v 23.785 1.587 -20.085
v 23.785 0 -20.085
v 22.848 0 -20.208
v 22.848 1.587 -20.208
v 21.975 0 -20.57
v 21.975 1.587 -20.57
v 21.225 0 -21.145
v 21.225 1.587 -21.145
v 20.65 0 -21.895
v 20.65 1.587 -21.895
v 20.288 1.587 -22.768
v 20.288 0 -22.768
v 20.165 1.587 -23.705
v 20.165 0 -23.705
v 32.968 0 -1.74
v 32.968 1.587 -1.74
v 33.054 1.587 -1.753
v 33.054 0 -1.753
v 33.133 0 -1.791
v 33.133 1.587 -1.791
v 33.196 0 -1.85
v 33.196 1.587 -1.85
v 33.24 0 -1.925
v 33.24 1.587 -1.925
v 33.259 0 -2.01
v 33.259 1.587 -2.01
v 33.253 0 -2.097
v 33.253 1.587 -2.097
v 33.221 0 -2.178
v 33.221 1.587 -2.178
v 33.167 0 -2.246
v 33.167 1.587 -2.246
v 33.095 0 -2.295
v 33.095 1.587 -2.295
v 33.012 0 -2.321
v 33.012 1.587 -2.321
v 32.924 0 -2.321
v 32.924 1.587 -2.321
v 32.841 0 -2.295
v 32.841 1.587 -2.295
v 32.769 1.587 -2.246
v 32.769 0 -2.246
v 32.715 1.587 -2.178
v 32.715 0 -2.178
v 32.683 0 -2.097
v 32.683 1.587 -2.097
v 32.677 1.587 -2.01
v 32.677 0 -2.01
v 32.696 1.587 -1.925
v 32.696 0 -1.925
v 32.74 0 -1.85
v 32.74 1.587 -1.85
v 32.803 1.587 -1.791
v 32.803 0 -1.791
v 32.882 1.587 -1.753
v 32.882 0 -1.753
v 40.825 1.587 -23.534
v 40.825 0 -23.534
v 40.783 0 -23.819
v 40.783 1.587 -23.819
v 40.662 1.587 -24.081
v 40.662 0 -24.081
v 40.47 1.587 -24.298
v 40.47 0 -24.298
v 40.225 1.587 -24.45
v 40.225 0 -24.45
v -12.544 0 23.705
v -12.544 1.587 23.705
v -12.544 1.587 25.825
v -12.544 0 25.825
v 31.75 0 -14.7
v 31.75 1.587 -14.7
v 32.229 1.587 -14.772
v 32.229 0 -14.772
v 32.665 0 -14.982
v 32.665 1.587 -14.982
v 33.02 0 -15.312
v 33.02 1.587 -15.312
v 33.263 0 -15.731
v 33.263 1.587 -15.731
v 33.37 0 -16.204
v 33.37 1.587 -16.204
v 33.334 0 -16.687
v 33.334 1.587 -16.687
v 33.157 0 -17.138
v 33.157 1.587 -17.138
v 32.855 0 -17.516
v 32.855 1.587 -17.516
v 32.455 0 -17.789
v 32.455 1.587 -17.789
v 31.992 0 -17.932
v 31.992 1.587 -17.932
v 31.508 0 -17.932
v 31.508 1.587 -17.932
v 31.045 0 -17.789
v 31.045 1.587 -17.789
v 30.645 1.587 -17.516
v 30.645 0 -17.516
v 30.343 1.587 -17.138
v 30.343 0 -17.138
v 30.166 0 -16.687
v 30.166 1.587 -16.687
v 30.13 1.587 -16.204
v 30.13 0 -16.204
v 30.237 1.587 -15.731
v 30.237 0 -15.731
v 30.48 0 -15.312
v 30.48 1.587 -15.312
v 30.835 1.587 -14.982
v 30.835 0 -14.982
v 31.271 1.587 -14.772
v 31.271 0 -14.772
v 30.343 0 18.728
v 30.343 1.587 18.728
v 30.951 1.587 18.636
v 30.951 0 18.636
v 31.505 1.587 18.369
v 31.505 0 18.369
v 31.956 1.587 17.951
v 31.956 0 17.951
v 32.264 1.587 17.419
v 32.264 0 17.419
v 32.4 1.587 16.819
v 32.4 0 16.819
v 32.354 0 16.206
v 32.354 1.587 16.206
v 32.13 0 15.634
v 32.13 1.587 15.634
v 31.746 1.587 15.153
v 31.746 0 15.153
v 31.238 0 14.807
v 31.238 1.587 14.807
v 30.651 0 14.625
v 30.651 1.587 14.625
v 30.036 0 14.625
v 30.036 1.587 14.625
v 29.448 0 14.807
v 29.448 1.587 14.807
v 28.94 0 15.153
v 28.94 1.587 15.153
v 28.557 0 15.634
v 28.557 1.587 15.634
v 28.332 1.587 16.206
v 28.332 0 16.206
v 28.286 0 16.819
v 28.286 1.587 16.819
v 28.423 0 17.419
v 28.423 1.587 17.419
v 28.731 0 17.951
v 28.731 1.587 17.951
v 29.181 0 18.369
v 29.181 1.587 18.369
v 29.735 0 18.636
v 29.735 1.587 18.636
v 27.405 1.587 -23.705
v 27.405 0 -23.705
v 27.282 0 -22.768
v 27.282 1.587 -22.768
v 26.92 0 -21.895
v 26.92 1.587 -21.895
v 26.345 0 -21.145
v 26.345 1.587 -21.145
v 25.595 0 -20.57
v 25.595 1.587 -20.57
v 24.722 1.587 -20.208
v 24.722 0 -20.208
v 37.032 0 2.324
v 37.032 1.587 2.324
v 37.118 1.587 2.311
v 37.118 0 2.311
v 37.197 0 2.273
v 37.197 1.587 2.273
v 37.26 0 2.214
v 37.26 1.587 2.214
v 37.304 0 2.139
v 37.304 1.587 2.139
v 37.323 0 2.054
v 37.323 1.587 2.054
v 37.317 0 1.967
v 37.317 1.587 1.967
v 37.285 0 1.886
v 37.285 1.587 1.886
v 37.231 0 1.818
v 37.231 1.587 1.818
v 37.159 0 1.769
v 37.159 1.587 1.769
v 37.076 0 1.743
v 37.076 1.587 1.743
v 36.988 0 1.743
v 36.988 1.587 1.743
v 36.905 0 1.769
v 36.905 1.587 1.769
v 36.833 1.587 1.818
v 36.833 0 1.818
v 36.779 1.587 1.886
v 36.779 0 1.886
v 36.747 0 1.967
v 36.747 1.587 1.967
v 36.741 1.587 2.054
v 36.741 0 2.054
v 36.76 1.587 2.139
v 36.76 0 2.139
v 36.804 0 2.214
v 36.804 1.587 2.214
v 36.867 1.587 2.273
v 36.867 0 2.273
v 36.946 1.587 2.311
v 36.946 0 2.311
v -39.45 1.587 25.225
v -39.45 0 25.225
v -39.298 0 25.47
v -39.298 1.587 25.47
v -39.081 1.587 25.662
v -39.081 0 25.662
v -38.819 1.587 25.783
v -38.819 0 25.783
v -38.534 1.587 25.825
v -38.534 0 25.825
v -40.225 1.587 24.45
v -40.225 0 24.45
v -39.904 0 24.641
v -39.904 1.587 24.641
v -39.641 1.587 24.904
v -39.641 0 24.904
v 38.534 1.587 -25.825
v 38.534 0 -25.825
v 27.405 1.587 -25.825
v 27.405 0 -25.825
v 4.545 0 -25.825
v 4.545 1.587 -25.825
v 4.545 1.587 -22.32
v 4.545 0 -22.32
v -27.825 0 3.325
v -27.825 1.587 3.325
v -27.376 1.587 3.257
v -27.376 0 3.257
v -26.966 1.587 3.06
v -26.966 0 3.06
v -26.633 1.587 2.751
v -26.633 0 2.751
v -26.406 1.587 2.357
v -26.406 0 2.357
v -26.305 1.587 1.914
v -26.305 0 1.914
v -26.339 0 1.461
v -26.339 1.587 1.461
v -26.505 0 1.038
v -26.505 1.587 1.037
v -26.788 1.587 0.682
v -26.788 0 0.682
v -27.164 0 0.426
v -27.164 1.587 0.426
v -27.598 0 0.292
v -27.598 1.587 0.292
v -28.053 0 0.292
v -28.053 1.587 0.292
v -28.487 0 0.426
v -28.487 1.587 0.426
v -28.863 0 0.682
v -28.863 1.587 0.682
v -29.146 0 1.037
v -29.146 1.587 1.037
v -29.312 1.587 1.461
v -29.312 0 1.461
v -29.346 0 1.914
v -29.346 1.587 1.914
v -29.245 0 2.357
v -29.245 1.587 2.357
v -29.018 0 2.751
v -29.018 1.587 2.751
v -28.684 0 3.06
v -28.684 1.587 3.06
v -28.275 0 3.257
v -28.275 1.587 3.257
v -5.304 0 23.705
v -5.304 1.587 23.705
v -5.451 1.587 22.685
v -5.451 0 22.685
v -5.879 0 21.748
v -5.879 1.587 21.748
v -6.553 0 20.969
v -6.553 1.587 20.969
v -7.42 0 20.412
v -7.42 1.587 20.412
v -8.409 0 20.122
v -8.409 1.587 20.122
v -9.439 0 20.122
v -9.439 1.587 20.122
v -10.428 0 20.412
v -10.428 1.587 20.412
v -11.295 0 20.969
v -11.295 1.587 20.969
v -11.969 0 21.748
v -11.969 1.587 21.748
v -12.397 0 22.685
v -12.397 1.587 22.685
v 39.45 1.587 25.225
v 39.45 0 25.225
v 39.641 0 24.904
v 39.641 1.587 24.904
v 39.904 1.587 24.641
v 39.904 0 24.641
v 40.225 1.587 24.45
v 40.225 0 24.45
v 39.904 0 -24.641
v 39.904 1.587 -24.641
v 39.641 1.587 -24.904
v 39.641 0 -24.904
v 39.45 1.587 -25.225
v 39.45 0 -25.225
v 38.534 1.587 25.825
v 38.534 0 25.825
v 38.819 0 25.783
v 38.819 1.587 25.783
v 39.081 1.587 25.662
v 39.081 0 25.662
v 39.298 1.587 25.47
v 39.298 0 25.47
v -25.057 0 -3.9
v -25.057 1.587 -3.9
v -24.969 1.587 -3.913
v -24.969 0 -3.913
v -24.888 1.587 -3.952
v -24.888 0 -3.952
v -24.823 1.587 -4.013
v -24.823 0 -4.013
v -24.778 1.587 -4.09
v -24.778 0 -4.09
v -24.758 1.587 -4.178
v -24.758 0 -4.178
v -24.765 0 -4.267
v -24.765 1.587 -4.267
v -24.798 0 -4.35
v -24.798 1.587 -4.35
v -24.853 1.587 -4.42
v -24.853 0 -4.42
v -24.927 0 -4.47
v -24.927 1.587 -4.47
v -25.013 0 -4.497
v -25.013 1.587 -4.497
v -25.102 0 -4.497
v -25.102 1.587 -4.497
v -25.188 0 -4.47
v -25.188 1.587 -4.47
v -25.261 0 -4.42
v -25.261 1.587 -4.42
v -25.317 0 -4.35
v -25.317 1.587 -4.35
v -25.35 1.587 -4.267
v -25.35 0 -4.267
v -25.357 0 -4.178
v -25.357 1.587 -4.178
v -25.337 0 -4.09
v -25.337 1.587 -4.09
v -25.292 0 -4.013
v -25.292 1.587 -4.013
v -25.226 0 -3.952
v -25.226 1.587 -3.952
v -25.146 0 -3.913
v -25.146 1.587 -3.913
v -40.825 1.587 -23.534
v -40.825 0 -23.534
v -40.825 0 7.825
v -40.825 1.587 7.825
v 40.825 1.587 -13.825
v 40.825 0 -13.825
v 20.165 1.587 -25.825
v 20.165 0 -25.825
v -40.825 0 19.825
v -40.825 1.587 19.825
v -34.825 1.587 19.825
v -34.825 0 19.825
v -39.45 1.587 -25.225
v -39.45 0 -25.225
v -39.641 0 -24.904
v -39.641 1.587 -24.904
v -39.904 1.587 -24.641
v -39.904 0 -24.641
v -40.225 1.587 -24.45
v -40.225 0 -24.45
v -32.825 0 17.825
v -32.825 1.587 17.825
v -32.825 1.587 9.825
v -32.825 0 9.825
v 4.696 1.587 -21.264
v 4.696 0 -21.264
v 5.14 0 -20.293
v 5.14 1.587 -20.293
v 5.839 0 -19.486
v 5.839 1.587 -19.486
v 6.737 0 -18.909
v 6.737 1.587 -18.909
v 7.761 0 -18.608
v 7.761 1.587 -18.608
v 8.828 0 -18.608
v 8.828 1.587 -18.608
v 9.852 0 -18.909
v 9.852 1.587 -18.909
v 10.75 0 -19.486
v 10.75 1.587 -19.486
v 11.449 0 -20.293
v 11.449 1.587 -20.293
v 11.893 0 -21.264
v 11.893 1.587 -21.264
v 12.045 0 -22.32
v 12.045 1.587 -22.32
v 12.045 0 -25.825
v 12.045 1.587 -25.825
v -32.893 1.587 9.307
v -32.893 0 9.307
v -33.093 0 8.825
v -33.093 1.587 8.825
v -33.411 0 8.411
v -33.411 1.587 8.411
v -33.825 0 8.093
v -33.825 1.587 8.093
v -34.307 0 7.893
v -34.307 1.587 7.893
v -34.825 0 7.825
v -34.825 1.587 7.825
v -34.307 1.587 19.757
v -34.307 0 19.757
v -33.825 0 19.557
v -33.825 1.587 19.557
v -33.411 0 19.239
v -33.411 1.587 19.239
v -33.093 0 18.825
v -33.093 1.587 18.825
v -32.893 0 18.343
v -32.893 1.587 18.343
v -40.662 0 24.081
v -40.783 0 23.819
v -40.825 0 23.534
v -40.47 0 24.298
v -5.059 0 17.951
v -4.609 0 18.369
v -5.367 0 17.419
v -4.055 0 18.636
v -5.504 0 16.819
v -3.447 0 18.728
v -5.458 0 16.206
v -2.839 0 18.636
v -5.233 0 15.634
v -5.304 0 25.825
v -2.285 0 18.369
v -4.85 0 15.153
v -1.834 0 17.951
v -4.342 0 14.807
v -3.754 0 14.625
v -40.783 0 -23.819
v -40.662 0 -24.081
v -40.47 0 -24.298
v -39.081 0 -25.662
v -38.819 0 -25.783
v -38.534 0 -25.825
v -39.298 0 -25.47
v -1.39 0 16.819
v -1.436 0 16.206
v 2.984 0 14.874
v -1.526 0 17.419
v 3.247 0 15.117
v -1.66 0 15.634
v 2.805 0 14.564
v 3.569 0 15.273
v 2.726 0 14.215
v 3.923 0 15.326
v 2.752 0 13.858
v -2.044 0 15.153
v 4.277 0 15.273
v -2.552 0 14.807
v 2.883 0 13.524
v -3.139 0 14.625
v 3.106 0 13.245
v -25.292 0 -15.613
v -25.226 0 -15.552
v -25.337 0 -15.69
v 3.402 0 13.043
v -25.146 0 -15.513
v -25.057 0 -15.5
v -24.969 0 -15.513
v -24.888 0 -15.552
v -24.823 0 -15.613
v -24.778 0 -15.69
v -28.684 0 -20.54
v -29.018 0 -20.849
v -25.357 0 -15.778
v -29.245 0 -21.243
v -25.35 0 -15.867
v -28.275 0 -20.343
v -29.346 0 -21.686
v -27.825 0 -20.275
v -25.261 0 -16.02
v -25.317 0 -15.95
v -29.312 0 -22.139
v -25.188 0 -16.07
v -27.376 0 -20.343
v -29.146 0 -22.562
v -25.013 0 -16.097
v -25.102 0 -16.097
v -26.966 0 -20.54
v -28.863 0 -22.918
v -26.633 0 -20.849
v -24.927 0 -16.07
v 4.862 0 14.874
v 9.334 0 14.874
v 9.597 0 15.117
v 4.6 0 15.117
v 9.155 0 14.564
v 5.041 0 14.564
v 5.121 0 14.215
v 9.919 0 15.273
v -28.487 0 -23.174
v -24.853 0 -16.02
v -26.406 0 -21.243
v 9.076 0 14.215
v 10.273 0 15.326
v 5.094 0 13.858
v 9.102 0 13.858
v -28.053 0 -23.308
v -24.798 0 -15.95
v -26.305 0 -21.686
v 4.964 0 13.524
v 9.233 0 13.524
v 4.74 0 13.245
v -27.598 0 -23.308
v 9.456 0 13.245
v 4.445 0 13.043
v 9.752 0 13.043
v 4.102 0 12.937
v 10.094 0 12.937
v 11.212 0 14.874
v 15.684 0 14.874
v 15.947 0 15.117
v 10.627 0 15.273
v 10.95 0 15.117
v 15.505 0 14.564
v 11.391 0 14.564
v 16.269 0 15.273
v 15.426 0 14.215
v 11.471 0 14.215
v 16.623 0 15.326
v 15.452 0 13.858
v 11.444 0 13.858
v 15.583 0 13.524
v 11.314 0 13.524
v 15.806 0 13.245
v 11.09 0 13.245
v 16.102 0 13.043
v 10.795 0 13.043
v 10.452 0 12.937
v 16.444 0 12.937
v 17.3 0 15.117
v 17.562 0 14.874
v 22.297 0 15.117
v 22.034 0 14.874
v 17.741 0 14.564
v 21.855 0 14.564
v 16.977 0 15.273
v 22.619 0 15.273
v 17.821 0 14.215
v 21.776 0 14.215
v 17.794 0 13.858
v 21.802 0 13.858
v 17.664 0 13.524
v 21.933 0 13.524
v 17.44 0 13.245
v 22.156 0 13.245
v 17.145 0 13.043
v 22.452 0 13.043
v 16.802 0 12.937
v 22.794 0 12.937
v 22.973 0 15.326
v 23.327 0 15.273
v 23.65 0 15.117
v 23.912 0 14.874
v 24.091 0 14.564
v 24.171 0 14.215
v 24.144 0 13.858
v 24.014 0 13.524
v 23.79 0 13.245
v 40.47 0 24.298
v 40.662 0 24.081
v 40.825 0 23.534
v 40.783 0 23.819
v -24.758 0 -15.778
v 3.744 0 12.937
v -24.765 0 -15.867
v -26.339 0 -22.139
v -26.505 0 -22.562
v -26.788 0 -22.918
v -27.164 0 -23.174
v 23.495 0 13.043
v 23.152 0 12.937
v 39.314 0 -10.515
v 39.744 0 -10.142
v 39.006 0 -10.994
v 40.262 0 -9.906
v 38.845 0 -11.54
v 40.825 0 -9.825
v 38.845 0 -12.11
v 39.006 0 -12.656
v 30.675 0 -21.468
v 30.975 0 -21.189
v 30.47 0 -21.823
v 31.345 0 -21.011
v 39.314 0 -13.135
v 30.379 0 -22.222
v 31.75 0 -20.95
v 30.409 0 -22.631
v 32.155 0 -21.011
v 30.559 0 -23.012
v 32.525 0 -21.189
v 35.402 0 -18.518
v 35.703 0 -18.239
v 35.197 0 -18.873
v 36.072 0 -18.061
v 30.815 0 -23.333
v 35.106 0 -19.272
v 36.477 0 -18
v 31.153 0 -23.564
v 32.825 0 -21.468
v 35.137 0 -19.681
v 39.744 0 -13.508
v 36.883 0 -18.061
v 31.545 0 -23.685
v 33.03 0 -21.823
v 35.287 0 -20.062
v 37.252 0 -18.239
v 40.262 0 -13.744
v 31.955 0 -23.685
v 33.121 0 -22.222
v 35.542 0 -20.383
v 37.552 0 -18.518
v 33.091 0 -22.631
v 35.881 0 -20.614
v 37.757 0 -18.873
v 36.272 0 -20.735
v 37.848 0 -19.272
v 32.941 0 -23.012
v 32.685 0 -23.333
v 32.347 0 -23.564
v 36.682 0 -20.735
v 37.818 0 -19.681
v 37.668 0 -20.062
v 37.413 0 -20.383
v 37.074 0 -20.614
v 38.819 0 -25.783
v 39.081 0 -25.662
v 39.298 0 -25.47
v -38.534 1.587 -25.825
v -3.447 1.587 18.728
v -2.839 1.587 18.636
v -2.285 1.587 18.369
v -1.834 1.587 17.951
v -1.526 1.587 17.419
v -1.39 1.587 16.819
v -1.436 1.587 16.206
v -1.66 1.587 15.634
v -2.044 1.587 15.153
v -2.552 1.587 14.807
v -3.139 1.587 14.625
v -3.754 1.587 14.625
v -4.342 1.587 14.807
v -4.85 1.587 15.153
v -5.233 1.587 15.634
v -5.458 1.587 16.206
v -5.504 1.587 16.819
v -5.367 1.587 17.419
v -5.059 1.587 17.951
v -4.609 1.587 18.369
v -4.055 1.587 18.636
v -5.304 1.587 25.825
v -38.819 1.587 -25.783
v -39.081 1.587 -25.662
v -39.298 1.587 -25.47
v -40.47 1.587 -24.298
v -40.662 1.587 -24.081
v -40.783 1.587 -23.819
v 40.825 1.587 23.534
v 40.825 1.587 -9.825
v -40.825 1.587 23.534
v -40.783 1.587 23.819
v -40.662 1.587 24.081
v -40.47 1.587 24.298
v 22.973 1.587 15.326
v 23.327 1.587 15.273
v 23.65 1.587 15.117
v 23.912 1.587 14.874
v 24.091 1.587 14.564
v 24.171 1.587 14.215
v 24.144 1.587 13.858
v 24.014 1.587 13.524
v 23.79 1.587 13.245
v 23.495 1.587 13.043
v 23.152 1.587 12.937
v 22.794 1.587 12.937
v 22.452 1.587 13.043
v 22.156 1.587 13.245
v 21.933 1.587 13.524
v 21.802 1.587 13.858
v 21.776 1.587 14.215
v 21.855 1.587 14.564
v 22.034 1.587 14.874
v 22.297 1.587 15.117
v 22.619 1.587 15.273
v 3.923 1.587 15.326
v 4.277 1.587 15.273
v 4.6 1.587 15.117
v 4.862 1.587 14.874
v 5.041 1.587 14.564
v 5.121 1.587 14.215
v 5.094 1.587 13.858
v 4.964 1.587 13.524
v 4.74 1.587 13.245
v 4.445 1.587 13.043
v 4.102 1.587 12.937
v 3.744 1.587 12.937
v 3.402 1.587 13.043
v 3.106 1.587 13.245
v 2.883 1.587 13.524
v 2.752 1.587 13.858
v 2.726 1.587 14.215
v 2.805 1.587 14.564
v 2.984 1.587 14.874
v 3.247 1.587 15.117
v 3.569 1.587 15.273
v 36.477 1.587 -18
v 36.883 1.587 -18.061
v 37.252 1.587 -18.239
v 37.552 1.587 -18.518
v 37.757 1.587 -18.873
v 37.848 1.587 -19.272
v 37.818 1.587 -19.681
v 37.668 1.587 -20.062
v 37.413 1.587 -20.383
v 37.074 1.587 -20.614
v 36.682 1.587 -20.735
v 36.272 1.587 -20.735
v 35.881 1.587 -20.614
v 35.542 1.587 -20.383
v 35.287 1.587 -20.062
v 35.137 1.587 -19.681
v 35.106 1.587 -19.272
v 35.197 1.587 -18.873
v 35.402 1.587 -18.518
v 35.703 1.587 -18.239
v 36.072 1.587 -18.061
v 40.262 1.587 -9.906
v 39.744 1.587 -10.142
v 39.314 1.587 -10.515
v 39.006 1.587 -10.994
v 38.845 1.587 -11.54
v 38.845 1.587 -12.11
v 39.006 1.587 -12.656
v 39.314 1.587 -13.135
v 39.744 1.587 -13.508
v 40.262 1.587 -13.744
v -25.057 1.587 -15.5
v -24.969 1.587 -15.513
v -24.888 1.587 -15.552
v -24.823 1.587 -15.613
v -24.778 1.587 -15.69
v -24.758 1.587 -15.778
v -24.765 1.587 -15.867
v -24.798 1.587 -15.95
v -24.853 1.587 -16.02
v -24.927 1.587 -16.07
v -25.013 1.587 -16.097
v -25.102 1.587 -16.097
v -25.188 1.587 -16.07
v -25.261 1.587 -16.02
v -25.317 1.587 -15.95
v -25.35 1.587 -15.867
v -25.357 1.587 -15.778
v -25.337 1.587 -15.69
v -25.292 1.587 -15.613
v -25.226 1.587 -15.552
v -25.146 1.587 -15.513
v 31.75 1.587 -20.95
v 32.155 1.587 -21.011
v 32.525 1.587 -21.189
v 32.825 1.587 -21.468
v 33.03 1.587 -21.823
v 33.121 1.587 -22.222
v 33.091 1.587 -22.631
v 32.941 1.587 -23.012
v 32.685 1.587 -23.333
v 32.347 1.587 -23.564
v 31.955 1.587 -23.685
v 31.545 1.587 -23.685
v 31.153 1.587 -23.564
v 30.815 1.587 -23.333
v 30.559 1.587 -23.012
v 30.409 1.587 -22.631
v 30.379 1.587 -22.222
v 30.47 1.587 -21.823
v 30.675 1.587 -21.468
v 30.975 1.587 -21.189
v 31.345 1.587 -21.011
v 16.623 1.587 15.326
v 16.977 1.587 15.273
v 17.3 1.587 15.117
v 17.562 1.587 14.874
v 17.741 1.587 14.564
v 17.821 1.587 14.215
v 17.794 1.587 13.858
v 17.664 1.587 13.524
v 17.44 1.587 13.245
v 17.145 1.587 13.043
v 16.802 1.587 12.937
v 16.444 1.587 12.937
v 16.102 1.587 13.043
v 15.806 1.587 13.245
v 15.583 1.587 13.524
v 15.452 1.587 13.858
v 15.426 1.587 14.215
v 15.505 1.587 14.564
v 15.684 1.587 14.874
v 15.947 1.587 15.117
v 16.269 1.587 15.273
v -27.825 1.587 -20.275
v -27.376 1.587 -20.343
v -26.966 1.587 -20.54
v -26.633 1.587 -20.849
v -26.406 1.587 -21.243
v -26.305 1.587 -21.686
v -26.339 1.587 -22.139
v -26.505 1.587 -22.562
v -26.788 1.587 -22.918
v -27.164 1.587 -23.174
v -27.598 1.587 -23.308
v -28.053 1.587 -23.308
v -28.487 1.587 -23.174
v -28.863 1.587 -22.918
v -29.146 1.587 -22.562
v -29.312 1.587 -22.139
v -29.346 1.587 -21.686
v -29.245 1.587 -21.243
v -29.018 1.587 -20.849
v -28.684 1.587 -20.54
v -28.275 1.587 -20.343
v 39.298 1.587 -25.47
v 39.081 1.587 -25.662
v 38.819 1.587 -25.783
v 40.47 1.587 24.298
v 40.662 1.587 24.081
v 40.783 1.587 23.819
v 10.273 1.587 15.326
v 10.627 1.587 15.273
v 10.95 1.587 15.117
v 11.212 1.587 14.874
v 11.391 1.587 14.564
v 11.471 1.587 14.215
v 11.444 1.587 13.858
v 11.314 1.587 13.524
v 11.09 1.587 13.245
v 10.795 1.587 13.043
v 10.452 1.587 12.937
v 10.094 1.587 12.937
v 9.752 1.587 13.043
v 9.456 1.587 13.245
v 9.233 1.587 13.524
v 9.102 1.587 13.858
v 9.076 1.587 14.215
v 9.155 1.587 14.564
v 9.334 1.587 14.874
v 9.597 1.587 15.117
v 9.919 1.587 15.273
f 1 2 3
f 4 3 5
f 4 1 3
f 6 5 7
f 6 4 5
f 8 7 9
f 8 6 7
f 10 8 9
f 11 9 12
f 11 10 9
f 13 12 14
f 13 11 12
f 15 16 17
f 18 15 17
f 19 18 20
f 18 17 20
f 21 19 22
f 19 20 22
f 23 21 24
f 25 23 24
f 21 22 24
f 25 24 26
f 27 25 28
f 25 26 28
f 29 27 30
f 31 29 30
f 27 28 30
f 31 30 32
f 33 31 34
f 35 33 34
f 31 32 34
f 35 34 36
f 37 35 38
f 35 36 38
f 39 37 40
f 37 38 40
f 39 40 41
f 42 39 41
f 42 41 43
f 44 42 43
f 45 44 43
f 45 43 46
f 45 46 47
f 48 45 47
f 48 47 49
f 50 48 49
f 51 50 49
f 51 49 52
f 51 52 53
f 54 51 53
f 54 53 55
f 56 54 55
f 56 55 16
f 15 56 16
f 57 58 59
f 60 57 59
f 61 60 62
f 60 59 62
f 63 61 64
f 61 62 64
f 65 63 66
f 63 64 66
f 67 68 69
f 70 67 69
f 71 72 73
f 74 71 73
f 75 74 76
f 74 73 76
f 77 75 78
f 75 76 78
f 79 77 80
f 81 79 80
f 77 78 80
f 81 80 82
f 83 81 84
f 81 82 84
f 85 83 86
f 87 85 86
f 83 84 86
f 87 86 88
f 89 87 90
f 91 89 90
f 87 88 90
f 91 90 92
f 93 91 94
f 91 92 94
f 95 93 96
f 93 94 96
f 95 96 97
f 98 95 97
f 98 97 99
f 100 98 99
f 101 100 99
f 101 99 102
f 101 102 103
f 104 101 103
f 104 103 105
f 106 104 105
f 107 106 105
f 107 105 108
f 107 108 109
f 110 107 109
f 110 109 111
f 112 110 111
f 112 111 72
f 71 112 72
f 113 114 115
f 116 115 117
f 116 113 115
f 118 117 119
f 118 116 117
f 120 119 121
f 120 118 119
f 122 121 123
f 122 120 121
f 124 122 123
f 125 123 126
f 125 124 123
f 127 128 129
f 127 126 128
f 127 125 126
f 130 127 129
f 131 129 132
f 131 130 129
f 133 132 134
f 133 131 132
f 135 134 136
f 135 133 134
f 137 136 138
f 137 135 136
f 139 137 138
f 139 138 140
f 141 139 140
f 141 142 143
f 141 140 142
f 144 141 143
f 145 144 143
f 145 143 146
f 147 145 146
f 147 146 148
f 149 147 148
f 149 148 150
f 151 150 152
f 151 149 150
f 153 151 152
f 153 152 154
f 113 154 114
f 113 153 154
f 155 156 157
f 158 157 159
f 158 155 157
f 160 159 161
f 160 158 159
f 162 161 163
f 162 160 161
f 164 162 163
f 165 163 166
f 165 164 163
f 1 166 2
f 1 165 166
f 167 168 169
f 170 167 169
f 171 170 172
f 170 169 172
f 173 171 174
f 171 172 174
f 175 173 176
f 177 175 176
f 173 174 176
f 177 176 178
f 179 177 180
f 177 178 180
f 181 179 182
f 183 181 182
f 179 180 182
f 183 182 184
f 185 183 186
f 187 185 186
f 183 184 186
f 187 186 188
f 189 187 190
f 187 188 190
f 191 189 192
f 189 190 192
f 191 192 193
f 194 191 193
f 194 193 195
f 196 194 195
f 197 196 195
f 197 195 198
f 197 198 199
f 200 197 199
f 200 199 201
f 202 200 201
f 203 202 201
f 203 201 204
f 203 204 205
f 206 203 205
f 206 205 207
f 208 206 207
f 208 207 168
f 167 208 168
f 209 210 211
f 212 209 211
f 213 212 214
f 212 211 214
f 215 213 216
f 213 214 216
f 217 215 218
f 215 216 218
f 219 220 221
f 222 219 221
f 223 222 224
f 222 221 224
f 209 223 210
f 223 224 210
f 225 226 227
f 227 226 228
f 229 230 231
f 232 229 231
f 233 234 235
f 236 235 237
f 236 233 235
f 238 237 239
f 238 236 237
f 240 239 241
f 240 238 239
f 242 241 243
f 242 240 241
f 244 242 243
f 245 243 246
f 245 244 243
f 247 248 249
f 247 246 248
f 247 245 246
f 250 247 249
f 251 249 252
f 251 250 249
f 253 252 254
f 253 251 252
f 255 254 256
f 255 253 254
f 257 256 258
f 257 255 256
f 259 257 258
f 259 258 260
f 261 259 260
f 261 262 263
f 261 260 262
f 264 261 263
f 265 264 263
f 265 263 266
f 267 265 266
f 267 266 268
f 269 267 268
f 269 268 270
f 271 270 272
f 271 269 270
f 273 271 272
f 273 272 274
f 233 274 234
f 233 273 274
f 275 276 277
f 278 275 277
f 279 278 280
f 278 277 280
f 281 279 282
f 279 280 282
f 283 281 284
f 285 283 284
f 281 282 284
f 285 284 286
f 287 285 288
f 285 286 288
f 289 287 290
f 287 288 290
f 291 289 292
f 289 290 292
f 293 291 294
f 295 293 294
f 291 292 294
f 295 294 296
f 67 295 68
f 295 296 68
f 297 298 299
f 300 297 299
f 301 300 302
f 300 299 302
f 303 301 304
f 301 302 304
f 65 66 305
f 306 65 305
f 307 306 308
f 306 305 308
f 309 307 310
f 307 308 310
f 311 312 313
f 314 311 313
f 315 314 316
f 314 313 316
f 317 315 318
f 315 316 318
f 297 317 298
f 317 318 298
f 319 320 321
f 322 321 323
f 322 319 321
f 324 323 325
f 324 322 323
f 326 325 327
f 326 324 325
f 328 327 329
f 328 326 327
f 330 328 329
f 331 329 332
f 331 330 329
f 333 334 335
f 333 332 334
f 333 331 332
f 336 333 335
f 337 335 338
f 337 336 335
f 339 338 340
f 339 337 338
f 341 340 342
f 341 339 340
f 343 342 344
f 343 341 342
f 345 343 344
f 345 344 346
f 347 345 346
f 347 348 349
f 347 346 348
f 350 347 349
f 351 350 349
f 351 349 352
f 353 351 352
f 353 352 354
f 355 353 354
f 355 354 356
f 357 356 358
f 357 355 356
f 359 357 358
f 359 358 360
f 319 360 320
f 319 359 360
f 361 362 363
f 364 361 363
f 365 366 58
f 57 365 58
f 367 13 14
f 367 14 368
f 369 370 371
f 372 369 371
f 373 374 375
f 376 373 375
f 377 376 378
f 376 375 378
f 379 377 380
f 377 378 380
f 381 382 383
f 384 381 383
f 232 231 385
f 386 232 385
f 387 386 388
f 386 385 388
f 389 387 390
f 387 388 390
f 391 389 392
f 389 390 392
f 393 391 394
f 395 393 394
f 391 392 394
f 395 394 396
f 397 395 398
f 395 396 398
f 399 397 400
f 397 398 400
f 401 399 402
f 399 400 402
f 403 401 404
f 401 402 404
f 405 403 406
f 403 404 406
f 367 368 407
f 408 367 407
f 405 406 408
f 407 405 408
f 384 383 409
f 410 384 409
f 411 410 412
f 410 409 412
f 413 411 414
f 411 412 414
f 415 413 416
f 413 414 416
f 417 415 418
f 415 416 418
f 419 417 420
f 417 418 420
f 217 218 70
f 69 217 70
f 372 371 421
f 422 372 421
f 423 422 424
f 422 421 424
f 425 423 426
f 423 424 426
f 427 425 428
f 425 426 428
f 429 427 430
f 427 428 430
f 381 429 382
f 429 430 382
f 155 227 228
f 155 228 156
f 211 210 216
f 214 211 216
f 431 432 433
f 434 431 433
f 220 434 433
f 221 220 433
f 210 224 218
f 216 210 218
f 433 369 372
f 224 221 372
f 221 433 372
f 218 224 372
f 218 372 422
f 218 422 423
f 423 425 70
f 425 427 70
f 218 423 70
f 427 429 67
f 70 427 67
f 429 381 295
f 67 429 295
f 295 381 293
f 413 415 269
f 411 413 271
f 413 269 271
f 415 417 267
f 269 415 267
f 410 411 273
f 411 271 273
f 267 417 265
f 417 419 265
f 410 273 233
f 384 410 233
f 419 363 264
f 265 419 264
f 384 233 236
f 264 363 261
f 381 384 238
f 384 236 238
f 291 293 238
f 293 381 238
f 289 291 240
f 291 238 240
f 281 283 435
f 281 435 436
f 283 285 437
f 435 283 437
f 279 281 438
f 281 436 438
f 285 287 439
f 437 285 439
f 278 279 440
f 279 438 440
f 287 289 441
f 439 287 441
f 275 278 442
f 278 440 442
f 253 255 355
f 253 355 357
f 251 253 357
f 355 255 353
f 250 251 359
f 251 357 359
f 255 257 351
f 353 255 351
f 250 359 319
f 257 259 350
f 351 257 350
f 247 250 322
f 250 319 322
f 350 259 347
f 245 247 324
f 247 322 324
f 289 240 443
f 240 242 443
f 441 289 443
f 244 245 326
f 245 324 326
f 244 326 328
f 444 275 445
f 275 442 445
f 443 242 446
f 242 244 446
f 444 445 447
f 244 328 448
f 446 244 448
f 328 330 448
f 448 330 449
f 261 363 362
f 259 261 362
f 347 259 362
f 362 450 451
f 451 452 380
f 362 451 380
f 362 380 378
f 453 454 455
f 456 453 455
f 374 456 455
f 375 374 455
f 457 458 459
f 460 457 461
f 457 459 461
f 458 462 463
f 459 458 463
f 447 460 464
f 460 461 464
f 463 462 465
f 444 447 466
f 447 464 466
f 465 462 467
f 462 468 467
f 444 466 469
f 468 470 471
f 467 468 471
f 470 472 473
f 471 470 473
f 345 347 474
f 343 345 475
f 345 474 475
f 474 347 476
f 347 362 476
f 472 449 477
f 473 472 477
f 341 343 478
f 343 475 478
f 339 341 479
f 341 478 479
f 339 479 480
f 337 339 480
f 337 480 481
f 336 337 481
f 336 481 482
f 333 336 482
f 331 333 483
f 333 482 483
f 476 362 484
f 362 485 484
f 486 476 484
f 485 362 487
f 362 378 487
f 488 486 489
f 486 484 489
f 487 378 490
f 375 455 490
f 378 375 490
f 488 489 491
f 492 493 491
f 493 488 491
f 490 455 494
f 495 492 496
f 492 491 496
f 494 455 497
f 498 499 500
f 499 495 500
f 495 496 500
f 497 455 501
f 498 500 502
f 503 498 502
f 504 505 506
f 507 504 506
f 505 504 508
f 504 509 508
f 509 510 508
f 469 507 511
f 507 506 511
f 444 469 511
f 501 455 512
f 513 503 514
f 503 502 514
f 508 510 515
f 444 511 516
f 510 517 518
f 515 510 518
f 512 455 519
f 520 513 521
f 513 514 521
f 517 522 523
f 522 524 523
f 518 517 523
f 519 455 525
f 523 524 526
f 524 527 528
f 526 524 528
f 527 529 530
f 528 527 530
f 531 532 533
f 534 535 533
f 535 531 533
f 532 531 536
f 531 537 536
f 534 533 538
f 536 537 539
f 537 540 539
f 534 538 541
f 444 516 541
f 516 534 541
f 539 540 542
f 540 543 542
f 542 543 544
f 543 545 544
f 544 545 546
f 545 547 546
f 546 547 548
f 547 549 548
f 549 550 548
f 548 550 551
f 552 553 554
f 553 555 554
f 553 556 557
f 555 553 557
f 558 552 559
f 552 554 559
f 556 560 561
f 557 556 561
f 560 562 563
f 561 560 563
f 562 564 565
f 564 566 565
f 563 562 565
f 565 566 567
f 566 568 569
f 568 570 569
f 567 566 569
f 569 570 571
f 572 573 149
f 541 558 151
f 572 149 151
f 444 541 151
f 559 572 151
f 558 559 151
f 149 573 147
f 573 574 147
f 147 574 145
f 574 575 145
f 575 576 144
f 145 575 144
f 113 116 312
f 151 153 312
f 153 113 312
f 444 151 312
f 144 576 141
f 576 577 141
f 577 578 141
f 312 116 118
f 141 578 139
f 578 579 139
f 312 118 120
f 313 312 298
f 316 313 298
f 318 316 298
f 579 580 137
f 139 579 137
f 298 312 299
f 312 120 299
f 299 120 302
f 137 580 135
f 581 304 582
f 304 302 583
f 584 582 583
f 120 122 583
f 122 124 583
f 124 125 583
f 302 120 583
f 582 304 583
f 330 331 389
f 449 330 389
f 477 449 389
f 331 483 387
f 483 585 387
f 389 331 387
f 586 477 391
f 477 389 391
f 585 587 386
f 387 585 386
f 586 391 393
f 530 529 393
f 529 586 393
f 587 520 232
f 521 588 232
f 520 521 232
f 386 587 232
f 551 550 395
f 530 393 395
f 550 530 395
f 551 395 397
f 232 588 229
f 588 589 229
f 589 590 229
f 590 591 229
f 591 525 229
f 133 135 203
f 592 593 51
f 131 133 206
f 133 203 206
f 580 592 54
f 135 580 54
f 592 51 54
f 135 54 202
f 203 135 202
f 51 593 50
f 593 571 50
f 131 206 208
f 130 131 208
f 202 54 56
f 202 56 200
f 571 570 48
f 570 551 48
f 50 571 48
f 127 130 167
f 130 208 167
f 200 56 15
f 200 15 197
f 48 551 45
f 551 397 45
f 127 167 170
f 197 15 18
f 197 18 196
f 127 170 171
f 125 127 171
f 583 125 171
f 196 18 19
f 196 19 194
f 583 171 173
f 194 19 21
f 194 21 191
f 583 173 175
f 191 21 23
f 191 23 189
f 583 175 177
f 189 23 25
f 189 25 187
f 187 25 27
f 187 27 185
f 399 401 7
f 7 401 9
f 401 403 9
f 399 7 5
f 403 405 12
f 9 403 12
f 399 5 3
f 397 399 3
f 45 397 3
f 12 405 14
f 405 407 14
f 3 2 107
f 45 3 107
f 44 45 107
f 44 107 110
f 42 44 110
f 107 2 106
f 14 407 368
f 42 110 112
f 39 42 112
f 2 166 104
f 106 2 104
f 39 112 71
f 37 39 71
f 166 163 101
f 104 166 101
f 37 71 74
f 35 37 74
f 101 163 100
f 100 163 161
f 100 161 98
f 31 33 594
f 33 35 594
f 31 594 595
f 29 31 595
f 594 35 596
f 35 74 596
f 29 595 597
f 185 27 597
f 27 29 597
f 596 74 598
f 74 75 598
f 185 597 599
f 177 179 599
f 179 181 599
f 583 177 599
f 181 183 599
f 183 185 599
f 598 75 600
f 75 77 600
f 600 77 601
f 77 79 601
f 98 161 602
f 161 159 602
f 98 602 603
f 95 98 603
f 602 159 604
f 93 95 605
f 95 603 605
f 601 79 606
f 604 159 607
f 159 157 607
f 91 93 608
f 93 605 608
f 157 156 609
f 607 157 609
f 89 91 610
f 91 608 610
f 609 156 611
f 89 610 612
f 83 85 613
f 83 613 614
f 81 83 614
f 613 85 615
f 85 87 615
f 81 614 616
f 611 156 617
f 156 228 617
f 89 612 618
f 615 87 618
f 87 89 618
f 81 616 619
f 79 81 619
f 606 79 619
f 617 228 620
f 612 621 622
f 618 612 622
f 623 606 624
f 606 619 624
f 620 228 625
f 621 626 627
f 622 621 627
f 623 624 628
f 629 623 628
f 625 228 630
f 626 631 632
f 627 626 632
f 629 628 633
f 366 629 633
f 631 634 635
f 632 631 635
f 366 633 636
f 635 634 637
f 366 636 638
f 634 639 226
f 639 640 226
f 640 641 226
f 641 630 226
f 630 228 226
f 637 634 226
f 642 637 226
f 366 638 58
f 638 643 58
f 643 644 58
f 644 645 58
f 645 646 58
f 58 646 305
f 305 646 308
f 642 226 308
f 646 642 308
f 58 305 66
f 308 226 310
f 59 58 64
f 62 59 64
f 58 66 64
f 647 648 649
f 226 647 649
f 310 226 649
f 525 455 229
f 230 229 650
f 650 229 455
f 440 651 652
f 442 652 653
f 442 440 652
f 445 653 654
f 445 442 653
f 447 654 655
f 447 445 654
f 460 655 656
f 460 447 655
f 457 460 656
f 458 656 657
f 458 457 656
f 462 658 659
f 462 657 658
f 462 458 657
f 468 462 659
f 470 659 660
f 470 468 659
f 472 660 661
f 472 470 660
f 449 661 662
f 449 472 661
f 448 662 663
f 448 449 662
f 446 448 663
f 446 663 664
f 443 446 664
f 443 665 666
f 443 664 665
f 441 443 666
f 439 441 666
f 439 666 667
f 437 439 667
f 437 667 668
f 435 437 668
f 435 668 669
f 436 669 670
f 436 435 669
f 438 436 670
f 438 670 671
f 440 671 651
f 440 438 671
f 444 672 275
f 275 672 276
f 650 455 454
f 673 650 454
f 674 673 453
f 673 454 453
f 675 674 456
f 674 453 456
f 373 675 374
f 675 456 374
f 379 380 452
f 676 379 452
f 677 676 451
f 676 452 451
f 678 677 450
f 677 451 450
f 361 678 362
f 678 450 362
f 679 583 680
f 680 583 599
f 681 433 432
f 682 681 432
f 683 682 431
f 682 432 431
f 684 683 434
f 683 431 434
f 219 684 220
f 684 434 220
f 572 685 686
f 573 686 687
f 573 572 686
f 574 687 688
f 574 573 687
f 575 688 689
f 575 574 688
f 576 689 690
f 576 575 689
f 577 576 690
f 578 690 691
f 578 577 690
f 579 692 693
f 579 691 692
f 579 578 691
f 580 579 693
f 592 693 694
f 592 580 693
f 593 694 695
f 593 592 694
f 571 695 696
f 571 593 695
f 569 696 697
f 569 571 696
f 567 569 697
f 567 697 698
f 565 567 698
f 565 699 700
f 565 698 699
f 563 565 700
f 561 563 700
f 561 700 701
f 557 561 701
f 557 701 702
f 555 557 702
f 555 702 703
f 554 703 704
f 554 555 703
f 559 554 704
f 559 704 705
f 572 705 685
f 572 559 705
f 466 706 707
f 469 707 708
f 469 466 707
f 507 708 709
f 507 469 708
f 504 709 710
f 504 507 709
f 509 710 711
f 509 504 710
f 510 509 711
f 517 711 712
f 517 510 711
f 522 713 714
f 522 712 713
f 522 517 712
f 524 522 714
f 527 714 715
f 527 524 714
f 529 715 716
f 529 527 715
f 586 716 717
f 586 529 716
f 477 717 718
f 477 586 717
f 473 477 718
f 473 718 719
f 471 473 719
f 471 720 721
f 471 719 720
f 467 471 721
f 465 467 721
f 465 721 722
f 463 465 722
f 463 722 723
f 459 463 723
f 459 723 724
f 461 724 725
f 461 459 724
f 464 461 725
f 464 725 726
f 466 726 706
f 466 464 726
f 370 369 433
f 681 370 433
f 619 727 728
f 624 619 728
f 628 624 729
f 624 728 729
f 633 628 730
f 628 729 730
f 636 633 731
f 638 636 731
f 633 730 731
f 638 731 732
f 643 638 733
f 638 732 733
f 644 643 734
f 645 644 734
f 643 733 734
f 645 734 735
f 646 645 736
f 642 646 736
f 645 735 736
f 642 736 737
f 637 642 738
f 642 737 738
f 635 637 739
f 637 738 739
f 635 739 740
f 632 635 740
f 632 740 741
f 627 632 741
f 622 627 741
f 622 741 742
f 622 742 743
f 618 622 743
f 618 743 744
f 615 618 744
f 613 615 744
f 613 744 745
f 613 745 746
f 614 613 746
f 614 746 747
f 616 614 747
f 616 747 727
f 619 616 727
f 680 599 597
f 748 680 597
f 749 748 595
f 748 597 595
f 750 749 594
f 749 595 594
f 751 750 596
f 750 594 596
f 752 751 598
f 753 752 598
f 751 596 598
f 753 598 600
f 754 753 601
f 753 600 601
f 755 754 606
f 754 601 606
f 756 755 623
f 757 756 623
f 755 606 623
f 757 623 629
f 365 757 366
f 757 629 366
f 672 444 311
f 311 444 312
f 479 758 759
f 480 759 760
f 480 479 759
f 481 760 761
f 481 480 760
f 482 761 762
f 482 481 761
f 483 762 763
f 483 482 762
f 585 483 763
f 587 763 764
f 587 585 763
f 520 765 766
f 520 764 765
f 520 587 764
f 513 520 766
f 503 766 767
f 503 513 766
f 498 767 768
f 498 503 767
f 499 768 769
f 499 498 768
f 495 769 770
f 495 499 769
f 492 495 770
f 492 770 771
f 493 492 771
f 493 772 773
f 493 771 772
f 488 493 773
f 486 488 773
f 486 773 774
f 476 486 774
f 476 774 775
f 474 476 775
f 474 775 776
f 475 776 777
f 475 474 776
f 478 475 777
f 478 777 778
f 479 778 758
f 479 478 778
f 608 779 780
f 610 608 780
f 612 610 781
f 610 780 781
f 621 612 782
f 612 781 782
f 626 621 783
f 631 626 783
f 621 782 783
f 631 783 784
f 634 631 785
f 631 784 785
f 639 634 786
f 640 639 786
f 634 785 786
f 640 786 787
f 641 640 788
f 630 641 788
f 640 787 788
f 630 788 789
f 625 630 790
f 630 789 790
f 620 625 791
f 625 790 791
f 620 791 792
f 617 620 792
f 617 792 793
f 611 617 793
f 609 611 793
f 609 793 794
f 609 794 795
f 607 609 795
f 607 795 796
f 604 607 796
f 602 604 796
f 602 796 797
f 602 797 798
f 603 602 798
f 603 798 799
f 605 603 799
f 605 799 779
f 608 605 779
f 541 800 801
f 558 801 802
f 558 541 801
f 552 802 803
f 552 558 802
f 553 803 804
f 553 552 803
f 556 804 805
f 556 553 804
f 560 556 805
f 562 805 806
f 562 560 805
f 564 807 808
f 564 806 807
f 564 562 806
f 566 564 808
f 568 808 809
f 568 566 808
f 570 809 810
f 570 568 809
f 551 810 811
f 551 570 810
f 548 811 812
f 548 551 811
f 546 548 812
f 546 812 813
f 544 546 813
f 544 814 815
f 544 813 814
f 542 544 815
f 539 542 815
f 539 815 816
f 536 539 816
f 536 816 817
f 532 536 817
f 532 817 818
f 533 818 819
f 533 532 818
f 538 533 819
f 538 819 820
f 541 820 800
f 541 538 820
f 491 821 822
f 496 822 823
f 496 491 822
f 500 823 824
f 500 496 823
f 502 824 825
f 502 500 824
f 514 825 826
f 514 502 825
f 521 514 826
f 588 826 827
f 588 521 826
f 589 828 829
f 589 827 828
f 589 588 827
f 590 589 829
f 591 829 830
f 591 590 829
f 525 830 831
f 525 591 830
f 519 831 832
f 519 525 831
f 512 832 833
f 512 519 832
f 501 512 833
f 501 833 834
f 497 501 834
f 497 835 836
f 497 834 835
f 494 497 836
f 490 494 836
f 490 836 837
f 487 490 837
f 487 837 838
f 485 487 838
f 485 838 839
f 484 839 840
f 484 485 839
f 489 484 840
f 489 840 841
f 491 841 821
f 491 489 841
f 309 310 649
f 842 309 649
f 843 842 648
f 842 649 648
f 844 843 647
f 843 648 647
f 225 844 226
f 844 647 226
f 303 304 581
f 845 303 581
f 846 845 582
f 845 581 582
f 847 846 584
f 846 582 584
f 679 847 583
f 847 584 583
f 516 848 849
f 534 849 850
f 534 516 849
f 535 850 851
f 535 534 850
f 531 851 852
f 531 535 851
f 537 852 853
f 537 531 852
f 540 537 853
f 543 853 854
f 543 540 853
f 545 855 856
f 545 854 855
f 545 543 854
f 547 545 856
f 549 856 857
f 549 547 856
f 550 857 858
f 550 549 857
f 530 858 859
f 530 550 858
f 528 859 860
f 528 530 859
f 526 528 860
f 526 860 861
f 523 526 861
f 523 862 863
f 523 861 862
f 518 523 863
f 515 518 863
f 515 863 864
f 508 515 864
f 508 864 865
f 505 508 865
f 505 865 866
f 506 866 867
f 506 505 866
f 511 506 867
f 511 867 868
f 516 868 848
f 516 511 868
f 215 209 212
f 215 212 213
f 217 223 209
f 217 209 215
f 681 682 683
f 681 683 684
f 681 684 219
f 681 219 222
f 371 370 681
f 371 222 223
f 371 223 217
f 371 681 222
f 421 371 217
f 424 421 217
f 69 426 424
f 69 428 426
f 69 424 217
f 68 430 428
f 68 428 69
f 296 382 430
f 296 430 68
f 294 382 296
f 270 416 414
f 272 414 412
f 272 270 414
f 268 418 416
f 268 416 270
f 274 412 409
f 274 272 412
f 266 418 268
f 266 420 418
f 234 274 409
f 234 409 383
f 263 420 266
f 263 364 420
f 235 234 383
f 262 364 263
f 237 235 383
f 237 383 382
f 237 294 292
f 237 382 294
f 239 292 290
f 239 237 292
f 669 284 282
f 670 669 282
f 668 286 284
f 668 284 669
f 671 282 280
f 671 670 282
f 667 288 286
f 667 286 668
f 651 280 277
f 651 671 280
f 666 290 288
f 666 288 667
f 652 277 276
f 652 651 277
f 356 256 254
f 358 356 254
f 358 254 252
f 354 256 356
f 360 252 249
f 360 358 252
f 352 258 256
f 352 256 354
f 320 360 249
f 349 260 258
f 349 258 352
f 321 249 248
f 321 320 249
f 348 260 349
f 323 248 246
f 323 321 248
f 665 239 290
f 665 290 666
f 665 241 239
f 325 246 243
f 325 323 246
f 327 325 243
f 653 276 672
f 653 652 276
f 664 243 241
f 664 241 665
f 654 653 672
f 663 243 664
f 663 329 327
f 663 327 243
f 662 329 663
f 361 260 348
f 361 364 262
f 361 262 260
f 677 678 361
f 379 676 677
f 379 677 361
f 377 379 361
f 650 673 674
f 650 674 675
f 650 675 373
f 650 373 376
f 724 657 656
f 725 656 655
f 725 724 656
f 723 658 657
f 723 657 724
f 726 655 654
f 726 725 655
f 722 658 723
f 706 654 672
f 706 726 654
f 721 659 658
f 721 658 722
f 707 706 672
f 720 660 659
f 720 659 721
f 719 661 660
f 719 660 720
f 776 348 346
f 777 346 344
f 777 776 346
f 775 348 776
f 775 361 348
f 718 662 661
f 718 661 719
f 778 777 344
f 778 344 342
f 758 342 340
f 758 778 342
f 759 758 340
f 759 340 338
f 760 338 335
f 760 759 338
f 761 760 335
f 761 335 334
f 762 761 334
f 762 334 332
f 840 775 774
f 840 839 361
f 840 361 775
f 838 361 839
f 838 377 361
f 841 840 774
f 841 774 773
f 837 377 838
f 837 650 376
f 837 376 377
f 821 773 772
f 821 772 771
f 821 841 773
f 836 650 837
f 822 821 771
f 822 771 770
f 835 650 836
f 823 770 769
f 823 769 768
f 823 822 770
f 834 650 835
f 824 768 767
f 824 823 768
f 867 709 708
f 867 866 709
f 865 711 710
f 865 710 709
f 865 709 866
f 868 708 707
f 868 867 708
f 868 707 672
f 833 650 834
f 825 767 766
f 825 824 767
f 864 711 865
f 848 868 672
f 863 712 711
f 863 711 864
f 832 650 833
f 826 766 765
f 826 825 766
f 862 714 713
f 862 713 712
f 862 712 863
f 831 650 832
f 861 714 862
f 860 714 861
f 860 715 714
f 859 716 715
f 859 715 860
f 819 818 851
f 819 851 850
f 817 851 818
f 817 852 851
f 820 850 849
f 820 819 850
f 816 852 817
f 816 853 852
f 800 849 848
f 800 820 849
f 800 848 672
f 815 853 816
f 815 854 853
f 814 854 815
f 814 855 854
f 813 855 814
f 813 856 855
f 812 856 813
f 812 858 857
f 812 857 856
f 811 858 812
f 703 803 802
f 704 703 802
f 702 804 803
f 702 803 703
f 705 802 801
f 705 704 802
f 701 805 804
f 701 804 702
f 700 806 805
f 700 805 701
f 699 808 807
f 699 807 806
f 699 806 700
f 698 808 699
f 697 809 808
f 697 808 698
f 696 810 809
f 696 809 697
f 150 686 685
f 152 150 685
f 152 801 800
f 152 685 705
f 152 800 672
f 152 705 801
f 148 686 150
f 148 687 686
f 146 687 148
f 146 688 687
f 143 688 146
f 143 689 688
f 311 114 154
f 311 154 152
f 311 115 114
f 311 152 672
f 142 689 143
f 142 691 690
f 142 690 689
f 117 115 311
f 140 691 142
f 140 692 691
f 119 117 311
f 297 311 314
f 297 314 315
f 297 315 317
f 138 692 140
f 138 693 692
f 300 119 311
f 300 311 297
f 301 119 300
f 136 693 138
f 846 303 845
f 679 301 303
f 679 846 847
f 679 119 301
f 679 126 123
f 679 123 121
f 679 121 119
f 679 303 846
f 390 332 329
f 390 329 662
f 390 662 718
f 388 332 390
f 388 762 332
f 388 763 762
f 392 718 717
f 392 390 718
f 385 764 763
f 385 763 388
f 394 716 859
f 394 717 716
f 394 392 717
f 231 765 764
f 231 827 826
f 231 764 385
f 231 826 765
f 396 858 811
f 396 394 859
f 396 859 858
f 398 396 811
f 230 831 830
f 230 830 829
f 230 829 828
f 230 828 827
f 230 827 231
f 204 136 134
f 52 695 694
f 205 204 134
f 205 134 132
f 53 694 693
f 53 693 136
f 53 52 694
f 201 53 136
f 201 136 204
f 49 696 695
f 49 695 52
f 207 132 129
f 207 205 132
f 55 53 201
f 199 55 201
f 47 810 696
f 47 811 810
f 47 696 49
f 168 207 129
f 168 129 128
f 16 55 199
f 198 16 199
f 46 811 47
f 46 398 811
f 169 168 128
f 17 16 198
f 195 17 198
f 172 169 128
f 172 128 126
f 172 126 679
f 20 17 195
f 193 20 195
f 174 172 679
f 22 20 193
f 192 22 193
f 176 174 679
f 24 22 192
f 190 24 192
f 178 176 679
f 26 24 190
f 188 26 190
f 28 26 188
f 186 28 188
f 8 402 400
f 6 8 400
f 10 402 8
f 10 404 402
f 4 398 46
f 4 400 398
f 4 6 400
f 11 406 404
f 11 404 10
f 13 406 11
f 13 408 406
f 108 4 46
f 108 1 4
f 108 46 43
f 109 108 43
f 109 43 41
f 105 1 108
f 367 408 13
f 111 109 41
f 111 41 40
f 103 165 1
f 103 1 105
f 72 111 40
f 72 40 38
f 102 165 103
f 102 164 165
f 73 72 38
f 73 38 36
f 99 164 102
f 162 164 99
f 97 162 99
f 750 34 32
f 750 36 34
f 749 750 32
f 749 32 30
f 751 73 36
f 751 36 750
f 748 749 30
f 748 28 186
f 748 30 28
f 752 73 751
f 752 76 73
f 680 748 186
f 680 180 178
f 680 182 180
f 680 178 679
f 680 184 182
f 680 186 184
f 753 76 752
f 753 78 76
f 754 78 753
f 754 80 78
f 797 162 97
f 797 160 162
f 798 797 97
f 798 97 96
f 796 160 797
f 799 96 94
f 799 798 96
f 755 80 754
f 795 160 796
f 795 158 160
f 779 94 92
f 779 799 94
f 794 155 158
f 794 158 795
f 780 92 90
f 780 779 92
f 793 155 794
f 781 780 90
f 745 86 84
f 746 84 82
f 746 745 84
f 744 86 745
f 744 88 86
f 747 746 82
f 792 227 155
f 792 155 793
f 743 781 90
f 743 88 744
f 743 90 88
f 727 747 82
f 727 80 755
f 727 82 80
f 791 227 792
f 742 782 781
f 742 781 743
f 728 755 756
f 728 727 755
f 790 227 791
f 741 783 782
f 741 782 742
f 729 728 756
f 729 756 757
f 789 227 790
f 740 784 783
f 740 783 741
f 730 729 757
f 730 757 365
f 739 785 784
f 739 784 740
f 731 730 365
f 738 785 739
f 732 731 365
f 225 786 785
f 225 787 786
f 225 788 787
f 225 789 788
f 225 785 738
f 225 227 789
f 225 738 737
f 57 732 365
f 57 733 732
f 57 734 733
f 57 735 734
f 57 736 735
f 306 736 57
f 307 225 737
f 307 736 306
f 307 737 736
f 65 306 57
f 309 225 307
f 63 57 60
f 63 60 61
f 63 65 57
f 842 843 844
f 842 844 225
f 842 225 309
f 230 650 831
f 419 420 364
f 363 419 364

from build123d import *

# Parameters (mm, degrees)
BOSS_EXTRUDE2_DEPTH     = 1.587
SKETCH5_R               = 2.06268814
SKETCH5_R_2             = 1.20109573
SKETCH5_R_3             = 1.525
SKETCH5_R_4             = 0.3
CUT_EXTRUDE3_DEPTH      = 49.333526863
CUT_EXTRUDE4_DEPTH      = 49.333526863
CUT_EXTRUDE5_DEPTH      = 49.333526863
CUT_EXTRUDE7_DEPTH      = 49.333526863
CUT_EXTRUDE8_DEPTH      = 49.333526863
CUT_EXTRUDE9_DEPTH      = 49.333526863
CUT_EXTRUDE9_DEPTH_BACK = 49.333526863
SKETCH6_R               = 1.625
SKETCH6_R_2             = 1.375
CUT_EXTRUDE10_DEPTH     = 49.333526863
SKETCH18_R              = 0.2921
CUT_EXTRUDE11_DEPTH     = 49.333526863


with BuildPart() as part:
    # Sketch3 → Boss-Extrude2 (new body)
    with BuildSketch(Plane(origin=(0, 0, 0), x_dir=(1, 0, 0), z_dir=(0, 1, 0))):
        with BuildLine():
            Line((-38.533712153, -25.825), (38.533712153, -25.825))
            ThreePointArc((38.533712153, -25.825), (39.08143471, -25.661660027), (39.450227292, -25.225))
            ThreePointArc((39.450227292, -25.225), (39.764339828, -24.764339828), (40.225, -24.450227292))
            ThreePointArc((40.225, -24.450227292), (40.661660027, -24.08143471), (40.825, -23.533712153))
            Line((40.825, -23.533712153), (40.825, 23.533712153))
            ThreePointArc((40.825, 23.533712153), (40.661660027, 24.08143471), (40.225, 24.450227292))
            ThreePointArc((40.225, 24.450227292), (39.764339828, 24.764339828), (39.450227292, 25.225))
            ThreePointArc((39.450227292, 25.225), (39.08143471, 25.661660027), (38.533712153, 25.825))
            Line((38.533712153, 25.825), (-38.533712153, 25.825))
            ThreePointArc((-38.533712153, 25.825), (-39.08143471, 25.661660027), (-39.450227292, 25.225))
            ThreePointArc((-39.450227292, 25.225), (-39.764339828, 24.764339828), (-40.225, 24.450227292))
            ThreePointArc((-40.225, 24.450227292), (-40.661660027, 24.08143471), (-40.825, 23.533712153))
            Line((-40.825, 23.533712153), (-40.825, -23.533712153))
            ThreePointArc((-40.825, -23.533712153), (-40.661660027, -24.08143471), (-40.225, -24.450227292))
            ThreePointArc((-40.225, -24.450227292), (-39.764339828, -24.764339828), (-39.450227292, -25.225))
            ThreePointArc((-39.450227292, -25.225), (-39.08143471, -25.661660027), (-38.533712153, -25.825))
        make_face()
    extrude(amount=BOSS_EXTRUDE2_DEPTH)

    # Sketch5 → Cut-Extrude3 (cut, through all)
    with BuildSketch(Plane(origin=(0, 0, 0), x_dir=(1, 0, 0), z_dir=(0, 1, 0))):
        with Locations(Location((30.3434, -16.665, 0), (0, 0, 270))):
            Circle(SKETCH5_R)
        with Locations(Location((22.9734, -14.125, 0), (0, 0, 270))):
            Circle(SKETCH5_R_2)
        with Locations(Location((16.6234, -14.125, 0), (0, 0, 270))):
            Circle(SKETCH5_R_2)
        with Locations(Location((10.2734, -14.125, 0), (0, 0, 270))):
            Circle(SKETCH5_R_2)
        with Locations(Location((3.9234, -14.125, 0), (0, 0, 270))):
            Circle(SKETCH5_R_2)
        with Locations(Location((-3.4466, -16.665, 0), (0, 0, 270))):
            Circle(SKETCH5_R)
        with Locations(Location((-27.825419843, 21.8, 0), (0, 0, 270))):
            Circle(SKETCH5_R_3)
        with Locations(Location((-27.825419843, -1.8, 0), (0, 0, 270))):
            Circle(SKETCH5_R_3)
        with Locations(Location((-25.057419843, 15.8, 0), (0, 0, 270))):
            Circle(SKETCH5_R_4)
        with Locations(Location((-25.057419843, 4.2, 0), (0, 0, 270))):
            Circle(SKETCH5_R_4)
    extrude(amount=CUT_EXTRUDE3_DEPTH, mode=Mode.SUBTRACT)

    # Sketch8 → Cut-Extrude4 (cut, through all)
    with BuildSketch(Plane(origin=(0, 1.587, 0), x_dir=(1, 0, 0), z_dir=(0, 1, 0))):
        with BuildLine():
            Line((4.544580157, 25.825), (4.544580157, 22.32))
            ThreePointArc((4.544580157, 22.32), (8.294580157, 18.57), (12.044580157, 22.32))
            Line((12.044580157, 22.32), (12.044580157, 25.825))
            Line((12.044580157, 25.825), (4.544580157, 25.825))
        make_face()
    extrude(amount=-CUT_EXTRUDE4_DEPTH, mode=Mode.SUBTRACT)

    # Sketch9 → Cut-Extrude5 (cut, through all)
    with BuildSketch(Plane(origin=(0, 1.587, 0), x_dir=(1, 0, 0), z_dir=(0, 1, 0))):
        with BuildLine():
            Line((-40.825, -19.825), (-34.825, -19.825))
            ThreePointArc((-34.825, -19.825), (-33.410786438, -19.239213562), (-32.825, -17.825))
            Line((-32.825, -17.825), (-32.825, -9.825))
            ThreePointArc((-32.825, -9.825), (-33.410786438, -8.410786438), (-34.825, -7.825))
            Line((-34.825, -7.825), (-40.825, -7.825))
            Line((-40.825, -7.825), (-40.825, -19.825))
        make_face()
    extrude(amount=-CUT_EXTRUDE5_DEPTH, mode=Mode.SUBTRACT)

    # Sketch10 → Cut-Extrude7 (cut, through all)
    with BuildSketch(Plane(origin=(0, 1.587, 0), x_dir=(1, 0, 0), z_dir=(0, 1, 0))):
        with BuildLine():
            Line((20.165, 23.705), (20.165, 26.825))
            Line((20.165, 26.825), (27.405, 26.825))
            Line((27.405, 26.825), (27.405, 23.705))
            ThreePointArc((27.405, 23.705), (26.344726548, 21.145273452), (23.785, 20.085))
            ThreePointArc((23.785, 20.085), (21.225273452, 21.145273452), (20.165, 23.705))
        make_face()
    extrude(amount=-CUT_EXTRUDE7_DEPTH, mode=Mode.SUBTRACT)

    # Sketch12 → Cut-Extrude8 (cut, through all)
    with BuildSketch(Plane(origin=(0, 1.587, 0), x_dir=(1, 0, 0), z_dir=(0, 1, 0))):
        with BuildLine():
            Line((-12.54393673, -26.825), (-5.30393673, -26.825))
            Line((-5.30393673, -26.825), (-5.30393673, -23.705))
            ThreePointArc((-5.30393673, -23.705), (-8.92393673, -20.085), (-12.54393673, -23.705))
            Line((-12.54393673, -23.705), (-12.54393673, -26.825))
        make_face()
    extrude(amount=-CUT_EXTRUDE8_DEPTH, mode=Mode.SUBTRACT)

    # Sketch14 → Cut-Extrude9 (cut, two sides: drawn at the far end of the back side and taken through both)
    with BuildSketch(Plane(origin=(0, 1.587, 0), x_dir=(1, 0, 0), z_dir=(0, 1, 0)).offset(-CUT_EXTRUDE9_DEPTH_BACK)):
        with BuildLine():
            Line((232.361167195, 9.825), (40.825, 9.825))
            ThreePointArc((40.825, 9.825), (38.825, 11.825), (40.825, 13.825))
            Line((40.825, 13.825), (232.361167195, 13.825))
            Line((232.361167195, 13.825), (615.433501586, 13.825))
            Line((615.433501586, 13.825), (615.433501586, 9.825))
            Line((615.433501586, 9.825), (232.361167195, 9.825))
        make_face()
    extrude(amount=CUT_EXTRUDE9_DEPTH + CUT_EXTRUDE9_DEPTH_BACK, mode=Mode.SUBTRACT)

    # Sketch6 → Cut-Extrude10 (cut, through all)
    with BuildSketch(Plane(origin=(0, 1.587, 0), x_dir=(1, 0, 0), z_dir=(0, 1, 0))):
        with Locations(Location((31.75, 16.325, 0), (0, 0, 270))):
            Circle(SKETCH6_R)
        with Locations(Location((31.75, 22.325, 0), (0, 0, 270))):
            Circle(SKETCH6_R_2)
        with Locations(Location((36.477344643, 19.375, 0), (0, 0, 270))):
            Circle(SKETCH6_R_2)
    extrude(amount=-CUT_EXTRUDE10_DEPTH, mode=Mode.SUBTRACT)

    # Sketch18 → Cut-Extrude11 (cut, through all)
    with BuildSketch(Plane(origin=(0, 1.587, 0), x_dir=(1, 0, 0), z_dir=(0, 1, 0))):
        with Locations(Location((32.968, 2.032, 0), (0, 0, 270))):
            Circle(SKETCH18_R)
        with Locations(Location((37.032, -2.032, 0), (0, 0, 270))):
            Circle(SKETCH18_R)
    extrude(amount=-CUT_EXTRUDE11_DEPTH, mode=Mode.SUBTRACT)


solid = part.part
